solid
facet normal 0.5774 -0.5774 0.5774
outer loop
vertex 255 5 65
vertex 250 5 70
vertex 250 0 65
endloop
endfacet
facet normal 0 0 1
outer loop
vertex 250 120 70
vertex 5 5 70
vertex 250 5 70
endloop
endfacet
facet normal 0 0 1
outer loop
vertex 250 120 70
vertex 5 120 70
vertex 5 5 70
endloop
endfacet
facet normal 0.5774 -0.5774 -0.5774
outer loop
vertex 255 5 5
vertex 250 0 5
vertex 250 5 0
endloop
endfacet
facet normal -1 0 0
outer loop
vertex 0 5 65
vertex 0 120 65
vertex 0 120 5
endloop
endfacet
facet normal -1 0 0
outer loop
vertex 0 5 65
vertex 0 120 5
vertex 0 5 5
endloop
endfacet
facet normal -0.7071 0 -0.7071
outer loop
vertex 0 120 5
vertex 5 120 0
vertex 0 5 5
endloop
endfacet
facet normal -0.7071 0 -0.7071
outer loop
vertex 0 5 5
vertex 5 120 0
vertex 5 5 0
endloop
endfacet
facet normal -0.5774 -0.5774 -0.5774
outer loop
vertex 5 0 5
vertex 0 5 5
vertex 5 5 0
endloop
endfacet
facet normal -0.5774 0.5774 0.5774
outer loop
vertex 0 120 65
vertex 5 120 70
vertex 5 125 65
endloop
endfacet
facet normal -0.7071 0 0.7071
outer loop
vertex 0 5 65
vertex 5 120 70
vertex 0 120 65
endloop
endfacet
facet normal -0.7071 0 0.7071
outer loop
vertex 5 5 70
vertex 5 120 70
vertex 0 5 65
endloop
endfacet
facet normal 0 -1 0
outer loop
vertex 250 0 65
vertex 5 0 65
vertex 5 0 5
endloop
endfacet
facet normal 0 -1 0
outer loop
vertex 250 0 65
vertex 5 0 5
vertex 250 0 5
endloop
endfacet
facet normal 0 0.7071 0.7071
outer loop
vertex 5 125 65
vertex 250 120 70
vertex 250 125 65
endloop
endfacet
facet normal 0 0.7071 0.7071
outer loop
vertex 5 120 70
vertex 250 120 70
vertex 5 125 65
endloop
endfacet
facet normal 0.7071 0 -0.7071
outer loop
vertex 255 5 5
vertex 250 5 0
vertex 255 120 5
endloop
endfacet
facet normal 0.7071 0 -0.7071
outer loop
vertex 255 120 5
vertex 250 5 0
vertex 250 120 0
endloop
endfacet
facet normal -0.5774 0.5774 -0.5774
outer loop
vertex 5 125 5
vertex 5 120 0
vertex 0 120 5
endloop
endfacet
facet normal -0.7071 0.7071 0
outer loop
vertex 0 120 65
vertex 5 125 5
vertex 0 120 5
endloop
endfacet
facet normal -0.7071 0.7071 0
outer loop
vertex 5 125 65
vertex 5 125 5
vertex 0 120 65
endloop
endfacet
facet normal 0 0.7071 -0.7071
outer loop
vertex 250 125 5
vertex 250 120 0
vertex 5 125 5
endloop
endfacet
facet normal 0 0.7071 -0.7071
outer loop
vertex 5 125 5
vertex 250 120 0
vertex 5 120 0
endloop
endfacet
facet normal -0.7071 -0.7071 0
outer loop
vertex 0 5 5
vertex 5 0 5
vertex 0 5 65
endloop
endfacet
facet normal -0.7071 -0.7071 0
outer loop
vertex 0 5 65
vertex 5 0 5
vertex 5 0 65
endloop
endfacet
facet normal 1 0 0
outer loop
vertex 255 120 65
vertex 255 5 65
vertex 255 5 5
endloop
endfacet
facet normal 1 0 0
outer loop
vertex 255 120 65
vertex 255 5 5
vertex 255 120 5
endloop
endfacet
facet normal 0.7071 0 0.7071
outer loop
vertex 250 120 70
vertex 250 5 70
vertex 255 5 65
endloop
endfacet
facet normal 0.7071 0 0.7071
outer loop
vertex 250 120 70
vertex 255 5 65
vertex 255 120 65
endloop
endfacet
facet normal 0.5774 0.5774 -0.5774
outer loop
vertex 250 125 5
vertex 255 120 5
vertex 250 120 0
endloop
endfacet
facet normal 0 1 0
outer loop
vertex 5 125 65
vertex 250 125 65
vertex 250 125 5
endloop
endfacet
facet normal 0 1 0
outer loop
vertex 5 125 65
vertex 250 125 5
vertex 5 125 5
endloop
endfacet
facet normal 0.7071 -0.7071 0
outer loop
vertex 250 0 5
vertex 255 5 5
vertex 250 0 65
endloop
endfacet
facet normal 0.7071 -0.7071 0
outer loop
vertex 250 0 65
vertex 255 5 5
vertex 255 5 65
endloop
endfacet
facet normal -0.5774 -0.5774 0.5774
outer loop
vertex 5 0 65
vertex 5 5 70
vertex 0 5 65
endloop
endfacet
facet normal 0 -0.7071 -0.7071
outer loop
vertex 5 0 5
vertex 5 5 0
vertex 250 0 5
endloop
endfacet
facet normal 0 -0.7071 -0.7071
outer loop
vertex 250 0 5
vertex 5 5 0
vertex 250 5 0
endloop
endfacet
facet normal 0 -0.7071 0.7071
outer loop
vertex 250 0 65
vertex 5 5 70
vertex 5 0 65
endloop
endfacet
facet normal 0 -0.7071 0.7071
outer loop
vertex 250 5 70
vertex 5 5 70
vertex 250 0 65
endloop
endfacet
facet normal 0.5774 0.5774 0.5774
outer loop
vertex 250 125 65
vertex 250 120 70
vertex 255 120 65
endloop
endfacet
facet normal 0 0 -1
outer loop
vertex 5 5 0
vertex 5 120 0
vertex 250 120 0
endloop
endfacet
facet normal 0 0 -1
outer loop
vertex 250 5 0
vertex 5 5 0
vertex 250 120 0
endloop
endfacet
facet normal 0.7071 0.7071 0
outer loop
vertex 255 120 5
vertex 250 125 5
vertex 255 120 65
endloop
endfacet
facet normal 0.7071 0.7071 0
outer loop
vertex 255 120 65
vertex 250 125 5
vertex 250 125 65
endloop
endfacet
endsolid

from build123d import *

# Parameters (mm, degrees)
F0_W    = 255
F0_H    = 125
F3_SIZE = 5


with BuildPart() as f2:
    # F2: sweep along a path in F1
    with BuildLine(Plane.XZ) as f2_path:
        Line((0, 0), (0, 70))
    # F0 (on Top) → F2 (sweep)
    with BuildSketch(Plane.XY):
        with Locations((127.5, 62.5)):
            Rectangle(F0_W, F0_H)
    sweep(path=f2_path.line)

    # F3
    f3_edges = [f2.edges().sort_by_distance(p)[0] for p in [
        (127.5, 0, 70),
        (255, 62.5, 70),
        (0, 62.5, 70),
        (127.5, 125, 70),
        (255, 0, 35),
        (255, 125, 35),
        (0, 0, 35),
        (0, 62.5, 0),
        (127.5, 0, 0),
        (255, 62.5, 0),
        (127.5, 125, 0),
        (0, 125, 35),
    ]]
    chamfer(f3_edges, length=F3_SIZE)


solid = f2.part
